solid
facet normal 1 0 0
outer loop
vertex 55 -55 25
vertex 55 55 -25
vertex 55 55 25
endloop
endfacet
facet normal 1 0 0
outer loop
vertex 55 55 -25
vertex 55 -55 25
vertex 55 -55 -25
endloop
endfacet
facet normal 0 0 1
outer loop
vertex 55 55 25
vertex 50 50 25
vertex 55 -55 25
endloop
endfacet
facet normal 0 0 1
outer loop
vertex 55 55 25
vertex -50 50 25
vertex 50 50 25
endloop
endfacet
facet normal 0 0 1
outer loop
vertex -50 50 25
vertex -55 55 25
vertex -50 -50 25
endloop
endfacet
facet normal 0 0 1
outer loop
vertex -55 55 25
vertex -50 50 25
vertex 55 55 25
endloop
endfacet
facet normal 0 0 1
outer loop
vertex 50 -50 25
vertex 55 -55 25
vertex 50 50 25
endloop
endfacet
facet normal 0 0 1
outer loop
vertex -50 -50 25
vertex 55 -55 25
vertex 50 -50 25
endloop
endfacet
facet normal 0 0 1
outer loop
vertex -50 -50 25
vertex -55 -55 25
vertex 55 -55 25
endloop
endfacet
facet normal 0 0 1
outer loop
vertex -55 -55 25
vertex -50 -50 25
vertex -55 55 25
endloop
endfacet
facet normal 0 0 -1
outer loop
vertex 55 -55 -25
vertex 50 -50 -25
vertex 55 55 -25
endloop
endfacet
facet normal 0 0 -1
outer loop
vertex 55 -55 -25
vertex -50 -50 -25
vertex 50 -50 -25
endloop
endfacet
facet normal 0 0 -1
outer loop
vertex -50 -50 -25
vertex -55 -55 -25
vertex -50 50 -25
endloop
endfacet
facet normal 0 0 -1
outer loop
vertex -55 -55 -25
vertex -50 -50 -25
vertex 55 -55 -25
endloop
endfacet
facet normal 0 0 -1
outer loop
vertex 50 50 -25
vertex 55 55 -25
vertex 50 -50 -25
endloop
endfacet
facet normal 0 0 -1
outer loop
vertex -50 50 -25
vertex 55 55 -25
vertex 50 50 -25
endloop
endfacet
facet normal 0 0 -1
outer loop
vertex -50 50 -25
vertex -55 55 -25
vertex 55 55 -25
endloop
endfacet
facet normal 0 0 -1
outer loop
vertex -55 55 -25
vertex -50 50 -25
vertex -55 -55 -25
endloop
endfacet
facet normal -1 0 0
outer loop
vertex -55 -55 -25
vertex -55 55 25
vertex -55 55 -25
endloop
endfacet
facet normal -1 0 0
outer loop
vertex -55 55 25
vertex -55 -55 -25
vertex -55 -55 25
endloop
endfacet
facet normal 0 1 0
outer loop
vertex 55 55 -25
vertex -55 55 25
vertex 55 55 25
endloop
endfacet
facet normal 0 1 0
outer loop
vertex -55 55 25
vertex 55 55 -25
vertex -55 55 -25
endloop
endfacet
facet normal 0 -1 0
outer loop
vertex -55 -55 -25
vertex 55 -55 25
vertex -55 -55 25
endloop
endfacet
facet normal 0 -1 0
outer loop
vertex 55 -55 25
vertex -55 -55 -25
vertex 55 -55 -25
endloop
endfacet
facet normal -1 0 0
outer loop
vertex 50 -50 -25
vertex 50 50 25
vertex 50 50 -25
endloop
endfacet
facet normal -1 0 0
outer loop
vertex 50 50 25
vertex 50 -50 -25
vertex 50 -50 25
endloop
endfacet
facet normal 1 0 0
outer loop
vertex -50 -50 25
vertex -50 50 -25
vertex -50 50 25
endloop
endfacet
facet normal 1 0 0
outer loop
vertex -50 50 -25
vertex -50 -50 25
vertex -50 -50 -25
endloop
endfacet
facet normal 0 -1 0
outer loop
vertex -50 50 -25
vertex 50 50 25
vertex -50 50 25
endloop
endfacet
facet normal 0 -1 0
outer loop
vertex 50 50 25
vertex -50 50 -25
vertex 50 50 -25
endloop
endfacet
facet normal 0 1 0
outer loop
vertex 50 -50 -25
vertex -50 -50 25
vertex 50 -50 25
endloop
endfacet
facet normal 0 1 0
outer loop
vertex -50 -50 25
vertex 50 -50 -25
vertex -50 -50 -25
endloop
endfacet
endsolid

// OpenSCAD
width = 100;
depth = 50;
flame = 10;

difference(){
    cube([width+flame, width+flame, depth], true);
    cube([width, width, depth], true);
}
